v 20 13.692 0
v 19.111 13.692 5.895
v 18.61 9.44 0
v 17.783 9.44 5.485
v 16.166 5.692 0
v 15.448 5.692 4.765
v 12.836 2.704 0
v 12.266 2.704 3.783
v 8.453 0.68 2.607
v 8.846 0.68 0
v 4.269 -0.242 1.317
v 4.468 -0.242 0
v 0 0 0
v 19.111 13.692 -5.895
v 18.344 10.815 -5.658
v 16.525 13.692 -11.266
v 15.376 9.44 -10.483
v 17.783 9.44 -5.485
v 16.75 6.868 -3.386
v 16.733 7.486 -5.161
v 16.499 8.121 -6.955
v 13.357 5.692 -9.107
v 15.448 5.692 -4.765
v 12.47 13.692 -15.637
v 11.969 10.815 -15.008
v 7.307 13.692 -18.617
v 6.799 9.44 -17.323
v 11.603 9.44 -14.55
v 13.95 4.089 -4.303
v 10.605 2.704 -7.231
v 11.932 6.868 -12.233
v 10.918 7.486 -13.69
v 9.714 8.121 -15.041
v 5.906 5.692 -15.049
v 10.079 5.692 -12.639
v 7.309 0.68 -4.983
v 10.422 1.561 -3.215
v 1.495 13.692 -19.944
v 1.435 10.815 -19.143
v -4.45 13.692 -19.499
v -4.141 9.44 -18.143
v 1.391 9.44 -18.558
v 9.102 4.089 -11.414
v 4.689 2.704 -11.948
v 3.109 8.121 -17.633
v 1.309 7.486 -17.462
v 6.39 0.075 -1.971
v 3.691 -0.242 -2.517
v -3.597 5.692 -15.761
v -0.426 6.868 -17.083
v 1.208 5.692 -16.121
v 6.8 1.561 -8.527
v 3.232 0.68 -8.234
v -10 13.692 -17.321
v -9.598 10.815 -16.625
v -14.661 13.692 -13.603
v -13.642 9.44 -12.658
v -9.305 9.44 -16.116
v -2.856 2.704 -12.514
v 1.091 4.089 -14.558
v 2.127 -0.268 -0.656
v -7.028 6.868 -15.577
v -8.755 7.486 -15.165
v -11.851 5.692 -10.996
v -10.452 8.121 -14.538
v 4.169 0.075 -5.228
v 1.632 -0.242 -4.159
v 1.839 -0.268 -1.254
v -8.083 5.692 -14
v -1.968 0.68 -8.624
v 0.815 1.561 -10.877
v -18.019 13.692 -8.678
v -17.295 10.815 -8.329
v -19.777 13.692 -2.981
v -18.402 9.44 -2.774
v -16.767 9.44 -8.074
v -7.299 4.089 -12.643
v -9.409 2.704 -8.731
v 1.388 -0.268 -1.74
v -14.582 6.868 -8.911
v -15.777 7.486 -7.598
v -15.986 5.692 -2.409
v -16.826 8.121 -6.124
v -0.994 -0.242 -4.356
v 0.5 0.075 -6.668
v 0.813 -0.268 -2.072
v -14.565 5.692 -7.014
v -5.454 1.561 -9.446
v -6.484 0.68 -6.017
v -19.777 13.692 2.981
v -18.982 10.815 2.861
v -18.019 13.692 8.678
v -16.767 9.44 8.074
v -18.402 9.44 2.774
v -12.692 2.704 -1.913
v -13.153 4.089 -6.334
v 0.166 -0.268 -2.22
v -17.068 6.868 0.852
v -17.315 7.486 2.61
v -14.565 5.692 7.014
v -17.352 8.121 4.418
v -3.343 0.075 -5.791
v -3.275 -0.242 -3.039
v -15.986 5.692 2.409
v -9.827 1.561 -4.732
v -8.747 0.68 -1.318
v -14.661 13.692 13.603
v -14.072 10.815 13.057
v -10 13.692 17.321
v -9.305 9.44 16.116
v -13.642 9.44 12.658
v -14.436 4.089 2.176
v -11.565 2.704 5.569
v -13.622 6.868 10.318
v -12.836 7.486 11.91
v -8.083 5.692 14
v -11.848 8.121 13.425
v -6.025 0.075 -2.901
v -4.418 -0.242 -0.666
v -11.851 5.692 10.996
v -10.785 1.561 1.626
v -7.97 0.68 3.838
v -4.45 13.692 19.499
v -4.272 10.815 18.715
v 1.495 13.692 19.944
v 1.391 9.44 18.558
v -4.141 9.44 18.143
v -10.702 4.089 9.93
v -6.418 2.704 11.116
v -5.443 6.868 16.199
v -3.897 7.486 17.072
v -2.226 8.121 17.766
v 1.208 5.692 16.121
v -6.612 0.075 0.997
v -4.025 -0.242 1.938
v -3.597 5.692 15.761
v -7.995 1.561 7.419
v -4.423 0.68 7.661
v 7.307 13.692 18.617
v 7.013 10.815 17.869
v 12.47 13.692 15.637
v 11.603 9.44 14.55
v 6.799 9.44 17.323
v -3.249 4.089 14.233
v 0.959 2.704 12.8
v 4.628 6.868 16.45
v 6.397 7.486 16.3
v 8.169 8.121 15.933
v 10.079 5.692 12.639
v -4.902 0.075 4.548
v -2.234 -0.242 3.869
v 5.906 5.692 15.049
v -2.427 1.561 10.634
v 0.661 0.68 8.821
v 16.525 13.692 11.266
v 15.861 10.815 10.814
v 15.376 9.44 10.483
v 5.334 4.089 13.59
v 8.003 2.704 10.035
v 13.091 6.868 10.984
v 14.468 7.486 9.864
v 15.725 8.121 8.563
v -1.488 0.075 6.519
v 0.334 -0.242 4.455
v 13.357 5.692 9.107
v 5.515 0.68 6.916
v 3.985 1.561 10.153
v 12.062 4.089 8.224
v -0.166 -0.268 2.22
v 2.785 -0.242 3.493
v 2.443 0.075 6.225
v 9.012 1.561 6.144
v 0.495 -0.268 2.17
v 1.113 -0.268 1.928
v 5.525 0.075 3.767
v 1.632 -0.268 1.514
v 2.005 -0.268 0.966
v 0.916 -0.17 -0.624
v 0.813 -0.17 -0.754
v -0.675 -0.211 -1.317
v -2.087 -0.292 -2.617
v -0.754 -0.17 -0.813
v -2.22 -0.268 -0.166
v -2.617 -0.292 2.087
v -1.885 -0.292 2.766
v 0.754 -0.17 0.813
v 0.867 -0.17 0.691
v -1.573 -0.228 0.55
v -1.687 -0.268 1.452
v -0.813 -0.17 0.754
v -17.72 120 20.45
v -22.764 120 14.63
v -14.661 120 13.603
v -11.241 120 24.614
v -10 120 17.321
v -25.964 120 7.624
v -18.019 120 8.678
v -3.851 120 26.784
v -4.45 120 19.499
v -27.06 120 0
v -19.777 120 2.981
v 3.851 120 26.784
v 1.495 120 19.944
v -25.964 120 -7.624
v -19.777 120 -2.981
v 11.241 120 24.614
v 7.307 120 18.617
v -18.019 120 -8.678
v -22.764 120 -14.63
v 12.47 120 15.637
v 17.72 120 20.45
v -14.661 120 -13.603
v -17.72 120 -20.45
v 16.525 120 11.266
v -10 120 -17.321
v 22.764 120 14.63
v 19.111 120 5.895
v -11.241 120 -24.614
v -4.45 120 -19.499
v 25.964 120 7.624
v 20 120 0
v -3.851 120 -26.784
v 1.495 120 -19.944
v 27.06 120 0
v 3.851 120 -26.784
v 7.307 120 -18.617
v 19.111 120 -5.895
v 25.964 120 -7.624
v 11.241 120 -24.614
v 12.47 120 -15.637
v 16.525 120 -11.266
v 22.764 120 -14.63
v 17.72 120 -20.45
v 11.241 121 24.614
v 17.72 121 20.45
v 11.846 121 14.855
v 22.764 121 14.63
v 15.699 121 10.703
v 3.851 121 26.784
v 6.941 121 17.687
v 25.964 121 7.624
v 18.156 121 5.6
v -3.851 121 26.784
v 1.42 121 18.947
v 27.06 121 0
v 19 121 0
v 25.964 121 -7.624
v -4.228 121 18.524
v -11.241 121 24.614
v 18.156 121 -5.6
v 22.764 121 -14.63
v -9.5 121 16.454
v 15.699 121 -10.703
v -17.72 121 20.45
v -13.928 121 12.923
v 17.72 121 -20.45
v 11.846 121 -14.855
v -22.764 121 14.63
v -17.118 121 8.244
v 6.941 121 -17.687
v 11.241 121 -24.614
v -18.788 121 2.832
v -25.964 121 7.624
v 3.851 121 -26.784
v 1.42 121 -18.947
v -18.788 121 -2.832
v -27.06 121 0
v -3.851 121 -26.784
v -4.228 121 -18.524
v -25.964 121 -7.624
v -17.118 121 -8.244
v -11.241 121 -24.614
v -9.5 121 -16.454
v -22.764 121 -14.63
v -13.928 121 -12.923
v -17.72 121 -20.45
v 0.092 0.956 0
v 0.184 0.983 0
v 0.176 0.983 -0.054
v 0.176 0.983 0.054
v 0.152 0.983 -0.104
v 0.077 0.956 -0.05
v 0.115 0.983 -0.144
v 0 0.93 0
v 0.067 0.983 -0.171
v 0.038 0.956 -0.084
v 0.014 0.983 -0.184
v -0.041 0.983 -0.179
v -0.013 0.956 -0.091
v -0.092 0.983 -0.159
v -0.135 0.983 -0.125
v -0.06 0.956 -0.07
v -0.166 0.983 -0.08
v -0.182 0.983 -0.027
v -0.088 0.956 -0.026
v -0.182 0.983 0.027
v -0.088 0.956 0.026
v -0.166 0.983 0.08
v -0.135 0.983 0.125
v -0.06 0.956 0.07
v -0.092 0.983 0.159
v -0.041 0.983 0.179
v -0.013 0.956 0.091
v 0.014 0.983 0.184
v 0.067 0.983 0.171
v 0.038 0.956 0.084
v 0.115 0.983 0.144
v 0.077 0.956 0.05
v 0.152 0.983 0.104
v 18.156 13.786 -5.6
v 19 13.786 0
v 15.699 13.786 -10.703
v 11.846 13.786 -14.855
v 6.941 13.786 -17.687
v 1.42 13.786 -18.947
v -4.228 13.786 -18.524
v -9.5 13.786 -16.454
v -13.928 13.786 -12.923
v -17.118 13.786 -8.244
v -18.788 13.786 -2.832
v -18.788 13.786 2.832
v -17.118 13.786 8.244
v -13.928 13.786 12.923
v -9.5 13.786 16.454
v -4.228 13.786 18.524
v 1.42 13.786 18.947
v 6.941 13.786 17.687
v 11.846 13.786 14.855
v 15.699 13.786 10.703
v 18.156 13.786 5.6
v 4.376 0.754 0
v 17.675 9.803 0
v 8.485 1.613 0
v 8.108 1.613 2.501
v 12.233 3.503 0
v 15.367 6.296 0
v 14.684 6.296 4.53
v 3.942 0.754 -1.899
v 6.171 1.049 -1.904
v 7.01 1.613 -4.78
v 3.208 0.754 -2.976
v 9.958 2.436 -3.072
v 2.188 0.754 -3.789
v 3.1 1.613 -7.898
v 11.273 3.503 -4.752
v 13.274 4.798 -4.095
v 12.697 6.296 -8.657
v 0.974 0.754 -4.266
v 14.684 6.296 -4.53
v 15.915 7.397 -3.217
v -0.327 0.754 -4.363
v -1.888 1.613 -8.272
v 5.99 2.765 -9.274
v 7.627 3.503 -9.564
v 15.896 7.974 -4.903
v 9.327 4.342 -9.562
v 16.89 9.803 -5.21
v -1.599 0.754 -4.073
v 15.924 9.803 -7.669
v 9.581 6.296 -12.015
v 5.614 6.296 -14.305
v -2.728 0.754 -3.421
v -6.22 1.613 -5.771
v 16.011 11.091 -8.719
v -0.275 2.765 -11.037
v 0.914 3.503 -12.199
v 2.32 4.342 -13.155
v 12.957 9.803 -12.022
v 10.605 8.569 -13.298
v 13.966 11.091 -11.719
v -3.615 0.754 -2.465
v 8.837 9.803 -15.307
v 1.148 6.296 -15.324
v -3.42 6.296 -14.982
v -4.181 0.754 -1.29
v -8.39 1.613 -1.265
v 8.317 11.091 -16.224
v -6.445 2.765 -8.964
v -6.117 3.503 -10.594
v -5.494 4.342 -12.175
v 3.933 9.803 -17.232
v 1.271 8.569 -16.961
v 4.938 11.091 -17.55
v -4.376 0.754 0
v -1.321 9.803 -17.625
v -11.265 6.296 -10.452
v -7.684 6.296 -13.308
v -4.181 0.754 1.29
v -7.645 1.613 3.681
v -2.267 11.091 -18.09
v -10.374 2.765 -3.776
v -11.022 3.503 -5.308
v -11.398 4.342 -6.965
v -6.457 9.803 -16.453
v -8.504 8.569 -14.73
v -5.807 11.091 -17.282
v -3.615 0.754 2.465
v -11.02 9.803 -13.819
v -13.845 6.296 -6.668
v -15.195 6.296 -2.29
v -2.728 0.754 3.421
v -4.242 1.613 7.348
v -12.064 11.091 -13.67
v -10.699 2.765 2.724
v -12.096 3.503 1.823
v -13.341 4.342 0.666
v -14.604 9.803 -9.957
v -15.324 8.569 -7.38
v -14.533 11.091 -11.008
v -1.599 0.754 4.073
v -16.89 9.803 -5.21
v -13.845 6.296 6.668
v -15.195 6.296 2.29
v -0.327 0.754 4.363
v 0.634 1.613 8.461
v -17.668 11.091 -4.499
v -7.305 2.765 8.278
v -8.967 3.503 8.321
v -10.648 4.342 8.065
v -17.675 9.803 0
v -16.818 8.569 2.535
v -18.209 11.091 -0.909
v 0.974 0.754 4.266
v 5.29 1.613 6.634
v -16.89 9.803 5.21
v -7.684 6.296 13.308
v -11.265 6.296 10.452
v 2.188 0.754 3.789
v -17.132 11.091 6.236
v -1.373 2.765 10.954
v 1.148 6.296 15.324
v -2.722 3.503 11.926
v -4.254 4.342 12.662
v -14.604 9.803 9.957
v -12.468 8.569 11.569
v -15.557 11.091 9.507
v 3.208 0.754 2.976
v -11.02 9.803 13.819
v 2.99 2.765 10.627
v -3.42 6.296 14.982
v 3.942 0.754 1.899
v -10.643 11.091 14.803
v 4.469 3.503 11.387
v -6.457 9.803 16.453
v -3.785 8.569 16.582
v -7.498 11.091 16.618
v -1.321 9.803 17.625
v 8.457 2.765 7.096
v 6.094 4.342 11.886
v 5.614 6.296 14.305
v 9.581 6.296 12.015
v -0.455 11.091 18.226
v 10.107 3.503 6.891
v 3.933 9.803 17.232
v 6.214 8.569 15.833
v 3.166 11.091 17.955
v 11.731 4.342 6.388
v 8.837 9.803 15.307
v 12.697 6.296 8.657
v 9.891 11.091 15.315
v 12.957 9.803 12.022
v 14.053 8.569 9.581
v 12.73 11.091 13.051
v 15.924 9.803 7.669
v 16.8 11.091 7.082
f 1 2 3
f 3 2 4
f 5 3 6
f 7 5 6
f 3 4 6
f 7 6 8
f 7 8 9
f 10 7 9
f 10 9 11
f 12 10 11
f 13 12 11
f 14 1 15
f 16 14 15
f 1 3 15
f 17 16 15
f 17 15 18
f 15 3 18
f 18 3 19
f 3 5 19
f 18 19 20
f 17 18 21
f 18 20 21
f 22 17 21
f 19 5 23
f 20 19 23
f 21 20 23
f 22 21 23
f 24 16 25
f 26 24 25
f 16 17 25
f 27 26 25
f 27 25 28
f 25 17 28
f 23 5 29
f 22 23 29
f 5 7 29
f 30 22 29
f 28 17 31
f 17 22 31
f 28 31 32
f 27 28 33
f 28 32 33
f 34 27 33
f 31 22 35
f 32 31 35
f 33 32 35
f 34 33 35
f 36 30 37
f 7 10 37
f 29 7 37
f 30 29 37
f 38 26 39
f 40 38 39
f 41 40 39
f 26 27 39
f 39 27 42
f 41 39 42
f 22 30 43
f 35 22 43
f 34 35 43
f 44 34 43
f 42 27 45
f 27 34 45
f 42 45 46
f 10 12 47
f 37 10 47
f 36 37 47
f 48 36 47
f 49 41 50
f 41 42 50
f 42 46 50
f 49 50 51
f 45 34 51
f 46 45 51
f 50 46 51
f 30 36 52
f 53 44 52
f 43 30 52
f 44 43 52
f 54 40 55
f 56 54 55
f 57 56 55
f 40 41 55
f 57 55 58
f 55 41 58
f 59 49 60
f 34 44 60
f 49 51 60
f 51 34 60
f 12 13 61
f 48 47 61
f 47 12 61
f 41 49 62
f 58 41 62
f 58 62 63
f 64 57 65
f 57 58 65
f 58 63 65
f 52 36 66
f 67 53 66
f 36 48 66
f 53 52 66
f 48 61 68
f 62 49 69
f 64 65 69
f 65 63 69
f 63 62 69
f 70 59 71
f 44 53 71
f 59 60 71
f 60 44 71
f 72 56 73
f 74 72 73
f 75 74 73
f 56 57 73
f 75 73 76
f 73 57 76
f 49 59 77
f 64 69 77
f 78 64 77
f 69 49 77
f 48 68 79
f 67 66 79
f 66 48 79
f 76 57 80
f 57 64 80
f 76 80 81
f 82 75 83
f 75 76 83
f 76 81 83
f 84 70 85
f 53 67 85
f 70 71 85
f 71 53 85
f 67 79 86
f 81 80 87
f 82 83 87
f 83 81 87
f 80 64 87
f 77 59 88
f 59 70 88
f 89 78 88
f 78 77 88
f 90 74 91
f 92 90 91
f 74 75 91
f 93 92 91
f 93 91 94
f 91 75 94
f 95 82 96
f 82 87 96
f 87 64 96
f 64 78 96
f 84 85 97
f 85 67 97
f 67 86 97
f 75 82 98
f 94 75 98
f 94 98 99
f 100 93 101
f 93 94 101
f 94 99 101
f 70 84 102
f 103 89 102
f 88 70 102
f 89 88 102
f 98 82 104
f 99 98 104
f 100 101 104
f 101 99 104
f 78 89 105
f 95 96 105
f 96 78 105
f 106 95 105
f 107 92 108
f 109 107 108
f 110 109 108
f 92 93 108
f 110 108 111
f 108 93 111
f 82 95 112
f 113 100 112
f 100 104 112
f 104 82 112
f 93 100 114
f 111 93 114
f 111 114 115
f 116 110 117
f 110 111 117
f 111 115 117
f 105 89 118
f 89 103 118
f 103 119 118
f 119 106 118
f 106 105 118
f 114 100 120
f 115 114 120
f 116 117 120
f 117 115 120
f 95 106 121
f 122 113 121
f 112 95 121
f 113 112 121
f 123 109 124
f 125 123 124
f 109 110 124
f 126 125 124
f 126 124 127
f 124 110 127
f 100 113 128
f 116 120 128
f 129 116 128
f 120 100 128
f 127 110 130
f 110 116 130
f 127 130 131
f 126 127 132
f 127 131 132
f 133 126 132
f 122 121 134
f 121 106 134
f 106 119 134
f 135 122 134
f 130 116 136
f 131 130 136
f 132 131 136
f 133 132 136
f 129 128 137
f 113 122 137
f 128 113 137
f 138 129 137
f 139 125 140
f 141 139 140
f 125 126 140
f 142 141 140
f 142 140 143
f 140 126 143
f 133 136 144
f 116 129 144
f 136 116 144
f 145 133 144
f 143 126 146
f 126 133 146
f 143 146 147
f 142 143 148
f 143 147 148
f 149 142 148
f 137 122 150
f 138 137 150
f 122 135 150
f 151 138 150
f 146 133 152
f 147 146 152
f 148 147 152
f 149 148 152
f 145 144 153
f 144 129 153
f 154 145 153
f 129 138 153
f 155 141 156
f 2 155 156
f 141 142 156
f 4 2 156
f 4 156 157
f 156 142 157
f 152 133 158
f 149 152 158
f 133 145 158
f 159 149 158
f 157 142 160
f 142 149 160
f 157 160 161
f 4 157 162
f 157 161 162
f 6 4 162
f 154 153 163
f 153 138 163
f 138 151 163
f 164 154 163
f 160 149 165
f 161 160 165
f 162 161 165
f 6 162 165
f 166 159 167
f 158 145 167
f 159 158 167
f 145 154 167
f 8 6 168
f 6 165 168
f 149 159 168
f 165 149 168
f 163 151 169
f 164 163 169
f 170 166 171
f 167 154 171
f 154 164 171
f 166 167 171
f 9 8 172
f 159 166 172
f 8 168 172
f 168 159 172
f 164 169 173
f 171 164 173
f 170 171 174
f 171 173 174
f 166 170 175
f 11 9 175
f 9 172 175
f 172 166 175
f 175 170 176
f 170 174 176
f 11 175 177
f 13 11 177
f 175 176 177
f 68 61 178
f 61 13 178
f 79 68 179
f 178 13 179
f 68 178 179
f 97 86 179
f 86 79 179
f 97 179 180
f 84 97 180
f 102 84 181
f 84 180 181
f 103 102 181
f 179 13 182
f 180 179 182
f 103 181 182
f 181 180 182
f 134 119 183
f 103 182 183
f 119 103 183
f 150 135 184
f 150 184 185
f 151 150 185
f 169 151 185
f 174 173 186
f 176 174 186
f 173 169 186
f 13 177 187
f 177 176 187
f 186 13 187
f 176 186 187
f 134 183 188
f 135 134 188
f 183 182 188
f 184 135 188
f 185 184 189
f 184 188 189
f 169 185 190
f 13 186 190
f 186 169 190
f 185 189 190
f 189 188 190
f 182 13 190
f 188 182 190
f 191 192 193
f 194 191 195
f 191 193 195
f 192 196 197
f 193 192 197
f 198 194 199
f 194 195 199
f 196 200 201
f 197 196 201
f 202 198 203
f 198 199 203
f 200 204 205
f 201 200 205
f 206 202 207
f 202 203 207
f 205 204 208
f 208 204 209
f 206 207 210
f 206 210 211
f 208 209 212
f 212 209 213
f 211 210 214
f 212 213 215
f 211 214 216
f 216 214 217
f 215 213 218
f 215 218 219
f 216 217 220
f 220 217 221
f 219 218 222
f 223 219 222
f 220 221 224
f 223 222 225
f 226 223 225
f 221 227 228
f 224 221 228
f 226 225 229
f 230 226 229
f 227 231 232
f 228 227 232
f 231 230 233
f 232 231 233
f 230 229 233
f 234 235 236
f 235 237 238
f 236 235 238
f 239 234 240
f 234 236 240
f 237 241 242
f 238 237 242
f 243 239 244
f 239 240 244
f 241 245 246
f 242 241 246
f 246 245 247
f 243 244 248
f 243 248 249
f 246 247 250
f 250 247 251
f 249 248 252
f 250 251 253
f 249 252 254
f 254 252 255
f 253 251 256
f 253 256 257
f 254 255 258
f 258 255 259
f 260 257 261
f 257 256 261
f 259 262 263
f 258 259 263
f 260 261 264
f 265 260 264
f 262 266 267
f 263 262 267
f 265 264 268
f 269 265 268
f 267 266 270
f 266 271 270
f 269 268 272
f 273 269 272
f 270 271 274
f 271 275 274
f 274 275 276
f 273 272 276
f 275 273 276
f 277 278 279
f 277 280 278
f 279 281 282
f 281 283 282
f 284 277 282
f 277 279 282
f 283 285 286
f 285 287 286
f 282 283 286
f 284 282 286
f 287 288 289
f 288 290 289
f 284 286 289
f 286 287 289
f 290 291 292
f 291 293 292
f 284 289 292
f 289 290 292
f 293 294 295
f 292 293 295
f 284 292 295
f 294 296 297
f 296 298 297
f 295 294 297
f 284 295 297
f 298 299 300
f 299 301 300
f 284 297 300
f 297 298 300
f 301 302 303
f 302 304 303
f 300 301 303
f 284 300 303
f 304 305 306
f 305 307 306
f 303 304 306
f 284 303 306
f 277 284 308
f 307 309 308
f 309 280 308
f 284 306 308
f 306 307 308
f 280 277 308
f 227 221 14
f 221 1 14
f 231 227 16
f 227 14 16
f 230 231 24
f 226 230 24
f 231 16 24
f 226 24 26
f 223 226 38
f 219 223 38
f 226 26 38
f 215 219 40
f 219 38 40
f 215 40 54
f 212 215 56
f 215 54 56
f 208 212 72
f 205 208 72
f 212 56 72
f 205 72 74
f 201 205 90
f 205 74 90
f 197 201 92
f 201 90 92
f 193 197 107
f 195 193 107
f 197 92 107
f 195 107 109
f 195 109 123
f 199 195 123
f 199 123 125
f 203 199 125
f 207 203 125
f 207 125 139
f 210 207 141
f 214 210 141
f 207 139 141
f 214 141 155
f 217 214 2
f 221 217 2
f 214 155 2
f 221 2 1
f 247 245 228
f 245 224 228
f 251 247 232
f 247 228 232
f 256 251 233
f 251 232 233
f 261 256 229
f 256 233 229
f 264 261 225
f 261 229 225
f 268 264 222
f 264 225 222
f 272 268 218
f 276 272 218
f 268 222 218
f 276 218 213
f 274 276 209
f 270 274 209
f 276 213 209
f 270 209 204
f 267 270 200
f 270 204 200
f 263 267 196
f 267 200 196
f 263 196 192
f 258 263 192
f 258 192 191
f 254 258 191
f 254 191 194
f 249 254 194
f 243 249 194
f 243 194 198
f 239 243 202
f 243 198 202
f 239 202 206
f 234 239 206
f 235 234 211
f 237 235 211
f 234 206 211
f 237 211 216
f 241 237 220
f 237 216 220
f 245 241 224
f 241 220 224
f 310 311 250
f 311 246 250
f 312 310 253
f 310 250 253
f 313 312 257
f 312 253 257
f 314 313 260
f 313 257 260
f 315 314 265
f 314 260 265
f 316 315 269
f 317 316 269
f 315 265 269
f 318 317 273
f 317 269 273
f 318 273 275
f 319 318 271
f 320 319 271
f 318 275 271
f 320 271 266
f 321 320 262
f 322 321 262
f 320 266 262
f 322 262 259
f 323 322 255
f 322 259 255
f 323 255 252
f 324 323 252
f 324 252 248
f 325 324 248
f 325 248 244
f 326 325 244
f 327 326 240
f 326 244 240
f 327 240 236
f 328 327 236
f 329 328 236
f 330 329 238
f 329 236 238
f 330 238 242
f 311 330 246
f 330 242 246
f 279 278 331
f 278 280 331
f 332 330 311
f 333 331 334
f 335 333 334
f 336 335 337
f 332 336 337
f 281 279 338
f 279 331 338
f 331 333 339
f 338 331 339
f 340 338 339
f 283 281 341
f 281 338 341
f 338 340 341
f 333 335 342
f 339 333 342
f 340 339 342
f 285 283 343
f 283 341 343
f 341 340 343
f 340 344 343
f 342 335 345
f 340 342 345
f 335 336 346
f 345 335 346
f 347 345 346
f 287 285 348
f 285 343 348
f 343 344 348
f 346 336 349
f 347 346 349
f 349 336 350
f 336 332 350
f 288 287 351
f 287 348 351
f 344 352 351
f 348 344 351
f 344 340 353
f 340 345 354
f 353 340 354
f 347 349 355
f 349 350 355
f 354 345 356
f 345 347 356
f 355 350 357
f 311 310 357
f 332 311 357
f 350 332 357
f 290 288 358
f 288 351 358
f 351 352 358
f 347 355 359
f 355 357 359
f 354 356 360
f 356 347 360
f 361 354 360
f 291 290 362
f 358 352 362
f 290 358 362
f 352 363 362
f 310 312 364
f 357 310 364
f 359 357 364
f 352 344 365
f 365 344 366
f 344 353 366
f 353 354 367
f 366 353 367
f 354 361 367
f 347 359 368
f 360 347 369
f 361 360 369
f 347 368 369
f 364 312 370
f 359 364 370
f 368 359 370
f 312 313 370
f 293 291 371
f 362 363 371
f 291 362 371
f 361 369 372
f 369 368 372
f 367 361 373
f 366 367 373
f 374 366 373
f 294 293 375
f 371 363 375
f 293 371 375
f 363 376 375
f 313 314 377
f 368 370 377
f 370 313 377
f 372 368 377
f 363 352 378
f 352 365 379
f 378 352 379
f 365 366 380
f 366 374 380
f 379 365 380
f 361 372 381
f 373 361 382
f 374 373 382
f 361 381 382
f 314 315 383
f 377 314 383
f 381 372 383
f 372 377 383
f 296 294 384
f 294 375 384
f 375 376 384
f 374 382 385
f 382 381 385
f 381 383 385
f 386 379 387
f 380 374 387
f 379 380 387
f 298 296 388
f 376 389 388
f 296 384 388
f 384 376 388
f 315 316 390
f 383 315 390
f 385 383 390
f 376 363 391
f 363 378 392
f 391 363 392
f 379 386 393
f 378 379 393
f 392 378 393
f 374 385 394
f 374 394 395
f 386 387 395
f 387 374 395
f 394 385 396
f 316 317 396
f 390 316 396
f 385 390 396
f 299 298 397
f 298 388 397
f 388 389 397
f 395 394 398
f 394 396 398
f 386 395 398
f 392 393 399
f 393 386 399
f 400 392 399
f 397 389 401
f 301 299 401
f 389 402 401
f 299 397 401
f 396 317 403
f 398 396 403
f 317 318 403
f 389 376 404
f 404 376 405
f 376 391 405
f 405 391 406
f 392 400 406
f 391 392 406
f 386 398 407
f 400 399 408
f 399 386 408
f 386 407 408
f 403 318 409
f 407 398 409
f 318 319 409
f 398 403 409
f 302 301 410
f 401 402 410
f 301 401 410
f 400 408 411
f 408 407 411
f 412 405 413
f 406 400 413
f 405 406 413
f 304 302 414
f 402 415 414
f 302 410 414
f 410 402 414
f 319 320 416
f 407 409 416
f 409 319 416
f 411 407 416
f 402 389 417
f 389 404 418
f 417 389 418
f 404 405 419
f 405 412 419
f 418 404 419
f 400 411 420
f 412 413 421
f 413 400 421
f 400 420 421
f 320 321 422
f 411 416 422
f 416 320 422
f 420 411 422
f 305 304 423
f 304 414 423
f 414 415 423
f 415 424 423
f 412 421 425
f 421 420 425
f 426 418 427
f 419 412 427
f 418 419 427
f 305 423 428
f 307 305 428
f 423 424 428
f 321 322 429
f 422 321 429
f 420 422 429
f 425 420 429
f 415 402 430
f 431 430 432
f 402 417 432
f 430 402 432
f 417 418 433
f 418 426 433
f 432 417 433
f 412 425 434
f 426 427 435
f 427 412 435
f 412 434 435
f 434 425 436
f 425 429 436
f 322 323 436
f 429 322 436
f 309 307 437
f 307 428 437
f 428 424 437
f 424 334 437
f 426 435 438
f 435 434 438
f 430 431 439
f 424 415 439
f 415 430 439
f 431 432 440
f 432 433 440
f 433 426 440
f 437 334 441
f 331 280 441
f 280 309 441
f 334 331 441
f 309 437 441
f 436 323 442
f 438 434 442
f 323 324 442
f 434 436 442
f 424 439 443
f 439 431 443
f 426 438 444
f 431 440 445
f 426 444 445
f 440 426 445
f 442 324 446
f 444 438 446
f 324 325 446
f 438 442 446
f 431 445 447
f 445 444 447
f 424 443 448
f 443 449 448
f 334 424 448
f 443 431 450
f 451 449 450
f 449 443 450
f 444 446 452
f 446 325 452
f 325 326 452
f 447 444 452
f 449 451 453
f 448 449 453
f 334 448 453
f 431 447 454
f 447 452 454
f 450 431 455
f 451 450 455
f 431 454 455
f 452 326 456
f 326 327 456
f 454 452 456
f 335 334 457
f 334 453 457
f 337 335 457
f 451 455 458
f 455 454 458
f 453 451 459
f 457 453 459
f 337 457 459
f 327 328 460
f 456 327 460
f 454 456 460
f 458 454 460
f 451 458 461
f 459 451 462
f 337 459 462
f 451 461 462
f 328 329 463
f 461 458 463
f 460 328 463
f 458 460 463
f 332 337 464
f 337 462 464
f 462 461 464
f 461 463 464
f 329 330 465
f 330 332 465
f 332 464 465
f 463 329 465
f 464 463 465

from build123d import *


with BuildPart() as part:
    # Sketch2 → Revolve2 (revolve)
    with BuildSketch(Plane.XY):
        with BuildLine():
            Line((20, 120), (20, 13.692287852))
            ThreePointArc((20, 13.692287852), (12.835765664, 2.704008302), (0, 0))
            Line((0, 0), (0, 0.929650957))
            Line((0, 0.929650957), (0.184018204, 0.982922835))
            ThreePointArc((0.184018204, 0.982922835), (12.233100998, 3.503391888), (19, 13.786496394))
            Line((19, 13.786496394), (19, 121))
            Line((19, 121), (27.059808742, 121))
            Line((27.059808742, 121), (27.059808742, 120))
            Line((27.059808742, 120), (20, 120))
        make_face()
    revolve(axis=Axis((0, 0, 0), (0, 1, 0)))


solid = part.part
